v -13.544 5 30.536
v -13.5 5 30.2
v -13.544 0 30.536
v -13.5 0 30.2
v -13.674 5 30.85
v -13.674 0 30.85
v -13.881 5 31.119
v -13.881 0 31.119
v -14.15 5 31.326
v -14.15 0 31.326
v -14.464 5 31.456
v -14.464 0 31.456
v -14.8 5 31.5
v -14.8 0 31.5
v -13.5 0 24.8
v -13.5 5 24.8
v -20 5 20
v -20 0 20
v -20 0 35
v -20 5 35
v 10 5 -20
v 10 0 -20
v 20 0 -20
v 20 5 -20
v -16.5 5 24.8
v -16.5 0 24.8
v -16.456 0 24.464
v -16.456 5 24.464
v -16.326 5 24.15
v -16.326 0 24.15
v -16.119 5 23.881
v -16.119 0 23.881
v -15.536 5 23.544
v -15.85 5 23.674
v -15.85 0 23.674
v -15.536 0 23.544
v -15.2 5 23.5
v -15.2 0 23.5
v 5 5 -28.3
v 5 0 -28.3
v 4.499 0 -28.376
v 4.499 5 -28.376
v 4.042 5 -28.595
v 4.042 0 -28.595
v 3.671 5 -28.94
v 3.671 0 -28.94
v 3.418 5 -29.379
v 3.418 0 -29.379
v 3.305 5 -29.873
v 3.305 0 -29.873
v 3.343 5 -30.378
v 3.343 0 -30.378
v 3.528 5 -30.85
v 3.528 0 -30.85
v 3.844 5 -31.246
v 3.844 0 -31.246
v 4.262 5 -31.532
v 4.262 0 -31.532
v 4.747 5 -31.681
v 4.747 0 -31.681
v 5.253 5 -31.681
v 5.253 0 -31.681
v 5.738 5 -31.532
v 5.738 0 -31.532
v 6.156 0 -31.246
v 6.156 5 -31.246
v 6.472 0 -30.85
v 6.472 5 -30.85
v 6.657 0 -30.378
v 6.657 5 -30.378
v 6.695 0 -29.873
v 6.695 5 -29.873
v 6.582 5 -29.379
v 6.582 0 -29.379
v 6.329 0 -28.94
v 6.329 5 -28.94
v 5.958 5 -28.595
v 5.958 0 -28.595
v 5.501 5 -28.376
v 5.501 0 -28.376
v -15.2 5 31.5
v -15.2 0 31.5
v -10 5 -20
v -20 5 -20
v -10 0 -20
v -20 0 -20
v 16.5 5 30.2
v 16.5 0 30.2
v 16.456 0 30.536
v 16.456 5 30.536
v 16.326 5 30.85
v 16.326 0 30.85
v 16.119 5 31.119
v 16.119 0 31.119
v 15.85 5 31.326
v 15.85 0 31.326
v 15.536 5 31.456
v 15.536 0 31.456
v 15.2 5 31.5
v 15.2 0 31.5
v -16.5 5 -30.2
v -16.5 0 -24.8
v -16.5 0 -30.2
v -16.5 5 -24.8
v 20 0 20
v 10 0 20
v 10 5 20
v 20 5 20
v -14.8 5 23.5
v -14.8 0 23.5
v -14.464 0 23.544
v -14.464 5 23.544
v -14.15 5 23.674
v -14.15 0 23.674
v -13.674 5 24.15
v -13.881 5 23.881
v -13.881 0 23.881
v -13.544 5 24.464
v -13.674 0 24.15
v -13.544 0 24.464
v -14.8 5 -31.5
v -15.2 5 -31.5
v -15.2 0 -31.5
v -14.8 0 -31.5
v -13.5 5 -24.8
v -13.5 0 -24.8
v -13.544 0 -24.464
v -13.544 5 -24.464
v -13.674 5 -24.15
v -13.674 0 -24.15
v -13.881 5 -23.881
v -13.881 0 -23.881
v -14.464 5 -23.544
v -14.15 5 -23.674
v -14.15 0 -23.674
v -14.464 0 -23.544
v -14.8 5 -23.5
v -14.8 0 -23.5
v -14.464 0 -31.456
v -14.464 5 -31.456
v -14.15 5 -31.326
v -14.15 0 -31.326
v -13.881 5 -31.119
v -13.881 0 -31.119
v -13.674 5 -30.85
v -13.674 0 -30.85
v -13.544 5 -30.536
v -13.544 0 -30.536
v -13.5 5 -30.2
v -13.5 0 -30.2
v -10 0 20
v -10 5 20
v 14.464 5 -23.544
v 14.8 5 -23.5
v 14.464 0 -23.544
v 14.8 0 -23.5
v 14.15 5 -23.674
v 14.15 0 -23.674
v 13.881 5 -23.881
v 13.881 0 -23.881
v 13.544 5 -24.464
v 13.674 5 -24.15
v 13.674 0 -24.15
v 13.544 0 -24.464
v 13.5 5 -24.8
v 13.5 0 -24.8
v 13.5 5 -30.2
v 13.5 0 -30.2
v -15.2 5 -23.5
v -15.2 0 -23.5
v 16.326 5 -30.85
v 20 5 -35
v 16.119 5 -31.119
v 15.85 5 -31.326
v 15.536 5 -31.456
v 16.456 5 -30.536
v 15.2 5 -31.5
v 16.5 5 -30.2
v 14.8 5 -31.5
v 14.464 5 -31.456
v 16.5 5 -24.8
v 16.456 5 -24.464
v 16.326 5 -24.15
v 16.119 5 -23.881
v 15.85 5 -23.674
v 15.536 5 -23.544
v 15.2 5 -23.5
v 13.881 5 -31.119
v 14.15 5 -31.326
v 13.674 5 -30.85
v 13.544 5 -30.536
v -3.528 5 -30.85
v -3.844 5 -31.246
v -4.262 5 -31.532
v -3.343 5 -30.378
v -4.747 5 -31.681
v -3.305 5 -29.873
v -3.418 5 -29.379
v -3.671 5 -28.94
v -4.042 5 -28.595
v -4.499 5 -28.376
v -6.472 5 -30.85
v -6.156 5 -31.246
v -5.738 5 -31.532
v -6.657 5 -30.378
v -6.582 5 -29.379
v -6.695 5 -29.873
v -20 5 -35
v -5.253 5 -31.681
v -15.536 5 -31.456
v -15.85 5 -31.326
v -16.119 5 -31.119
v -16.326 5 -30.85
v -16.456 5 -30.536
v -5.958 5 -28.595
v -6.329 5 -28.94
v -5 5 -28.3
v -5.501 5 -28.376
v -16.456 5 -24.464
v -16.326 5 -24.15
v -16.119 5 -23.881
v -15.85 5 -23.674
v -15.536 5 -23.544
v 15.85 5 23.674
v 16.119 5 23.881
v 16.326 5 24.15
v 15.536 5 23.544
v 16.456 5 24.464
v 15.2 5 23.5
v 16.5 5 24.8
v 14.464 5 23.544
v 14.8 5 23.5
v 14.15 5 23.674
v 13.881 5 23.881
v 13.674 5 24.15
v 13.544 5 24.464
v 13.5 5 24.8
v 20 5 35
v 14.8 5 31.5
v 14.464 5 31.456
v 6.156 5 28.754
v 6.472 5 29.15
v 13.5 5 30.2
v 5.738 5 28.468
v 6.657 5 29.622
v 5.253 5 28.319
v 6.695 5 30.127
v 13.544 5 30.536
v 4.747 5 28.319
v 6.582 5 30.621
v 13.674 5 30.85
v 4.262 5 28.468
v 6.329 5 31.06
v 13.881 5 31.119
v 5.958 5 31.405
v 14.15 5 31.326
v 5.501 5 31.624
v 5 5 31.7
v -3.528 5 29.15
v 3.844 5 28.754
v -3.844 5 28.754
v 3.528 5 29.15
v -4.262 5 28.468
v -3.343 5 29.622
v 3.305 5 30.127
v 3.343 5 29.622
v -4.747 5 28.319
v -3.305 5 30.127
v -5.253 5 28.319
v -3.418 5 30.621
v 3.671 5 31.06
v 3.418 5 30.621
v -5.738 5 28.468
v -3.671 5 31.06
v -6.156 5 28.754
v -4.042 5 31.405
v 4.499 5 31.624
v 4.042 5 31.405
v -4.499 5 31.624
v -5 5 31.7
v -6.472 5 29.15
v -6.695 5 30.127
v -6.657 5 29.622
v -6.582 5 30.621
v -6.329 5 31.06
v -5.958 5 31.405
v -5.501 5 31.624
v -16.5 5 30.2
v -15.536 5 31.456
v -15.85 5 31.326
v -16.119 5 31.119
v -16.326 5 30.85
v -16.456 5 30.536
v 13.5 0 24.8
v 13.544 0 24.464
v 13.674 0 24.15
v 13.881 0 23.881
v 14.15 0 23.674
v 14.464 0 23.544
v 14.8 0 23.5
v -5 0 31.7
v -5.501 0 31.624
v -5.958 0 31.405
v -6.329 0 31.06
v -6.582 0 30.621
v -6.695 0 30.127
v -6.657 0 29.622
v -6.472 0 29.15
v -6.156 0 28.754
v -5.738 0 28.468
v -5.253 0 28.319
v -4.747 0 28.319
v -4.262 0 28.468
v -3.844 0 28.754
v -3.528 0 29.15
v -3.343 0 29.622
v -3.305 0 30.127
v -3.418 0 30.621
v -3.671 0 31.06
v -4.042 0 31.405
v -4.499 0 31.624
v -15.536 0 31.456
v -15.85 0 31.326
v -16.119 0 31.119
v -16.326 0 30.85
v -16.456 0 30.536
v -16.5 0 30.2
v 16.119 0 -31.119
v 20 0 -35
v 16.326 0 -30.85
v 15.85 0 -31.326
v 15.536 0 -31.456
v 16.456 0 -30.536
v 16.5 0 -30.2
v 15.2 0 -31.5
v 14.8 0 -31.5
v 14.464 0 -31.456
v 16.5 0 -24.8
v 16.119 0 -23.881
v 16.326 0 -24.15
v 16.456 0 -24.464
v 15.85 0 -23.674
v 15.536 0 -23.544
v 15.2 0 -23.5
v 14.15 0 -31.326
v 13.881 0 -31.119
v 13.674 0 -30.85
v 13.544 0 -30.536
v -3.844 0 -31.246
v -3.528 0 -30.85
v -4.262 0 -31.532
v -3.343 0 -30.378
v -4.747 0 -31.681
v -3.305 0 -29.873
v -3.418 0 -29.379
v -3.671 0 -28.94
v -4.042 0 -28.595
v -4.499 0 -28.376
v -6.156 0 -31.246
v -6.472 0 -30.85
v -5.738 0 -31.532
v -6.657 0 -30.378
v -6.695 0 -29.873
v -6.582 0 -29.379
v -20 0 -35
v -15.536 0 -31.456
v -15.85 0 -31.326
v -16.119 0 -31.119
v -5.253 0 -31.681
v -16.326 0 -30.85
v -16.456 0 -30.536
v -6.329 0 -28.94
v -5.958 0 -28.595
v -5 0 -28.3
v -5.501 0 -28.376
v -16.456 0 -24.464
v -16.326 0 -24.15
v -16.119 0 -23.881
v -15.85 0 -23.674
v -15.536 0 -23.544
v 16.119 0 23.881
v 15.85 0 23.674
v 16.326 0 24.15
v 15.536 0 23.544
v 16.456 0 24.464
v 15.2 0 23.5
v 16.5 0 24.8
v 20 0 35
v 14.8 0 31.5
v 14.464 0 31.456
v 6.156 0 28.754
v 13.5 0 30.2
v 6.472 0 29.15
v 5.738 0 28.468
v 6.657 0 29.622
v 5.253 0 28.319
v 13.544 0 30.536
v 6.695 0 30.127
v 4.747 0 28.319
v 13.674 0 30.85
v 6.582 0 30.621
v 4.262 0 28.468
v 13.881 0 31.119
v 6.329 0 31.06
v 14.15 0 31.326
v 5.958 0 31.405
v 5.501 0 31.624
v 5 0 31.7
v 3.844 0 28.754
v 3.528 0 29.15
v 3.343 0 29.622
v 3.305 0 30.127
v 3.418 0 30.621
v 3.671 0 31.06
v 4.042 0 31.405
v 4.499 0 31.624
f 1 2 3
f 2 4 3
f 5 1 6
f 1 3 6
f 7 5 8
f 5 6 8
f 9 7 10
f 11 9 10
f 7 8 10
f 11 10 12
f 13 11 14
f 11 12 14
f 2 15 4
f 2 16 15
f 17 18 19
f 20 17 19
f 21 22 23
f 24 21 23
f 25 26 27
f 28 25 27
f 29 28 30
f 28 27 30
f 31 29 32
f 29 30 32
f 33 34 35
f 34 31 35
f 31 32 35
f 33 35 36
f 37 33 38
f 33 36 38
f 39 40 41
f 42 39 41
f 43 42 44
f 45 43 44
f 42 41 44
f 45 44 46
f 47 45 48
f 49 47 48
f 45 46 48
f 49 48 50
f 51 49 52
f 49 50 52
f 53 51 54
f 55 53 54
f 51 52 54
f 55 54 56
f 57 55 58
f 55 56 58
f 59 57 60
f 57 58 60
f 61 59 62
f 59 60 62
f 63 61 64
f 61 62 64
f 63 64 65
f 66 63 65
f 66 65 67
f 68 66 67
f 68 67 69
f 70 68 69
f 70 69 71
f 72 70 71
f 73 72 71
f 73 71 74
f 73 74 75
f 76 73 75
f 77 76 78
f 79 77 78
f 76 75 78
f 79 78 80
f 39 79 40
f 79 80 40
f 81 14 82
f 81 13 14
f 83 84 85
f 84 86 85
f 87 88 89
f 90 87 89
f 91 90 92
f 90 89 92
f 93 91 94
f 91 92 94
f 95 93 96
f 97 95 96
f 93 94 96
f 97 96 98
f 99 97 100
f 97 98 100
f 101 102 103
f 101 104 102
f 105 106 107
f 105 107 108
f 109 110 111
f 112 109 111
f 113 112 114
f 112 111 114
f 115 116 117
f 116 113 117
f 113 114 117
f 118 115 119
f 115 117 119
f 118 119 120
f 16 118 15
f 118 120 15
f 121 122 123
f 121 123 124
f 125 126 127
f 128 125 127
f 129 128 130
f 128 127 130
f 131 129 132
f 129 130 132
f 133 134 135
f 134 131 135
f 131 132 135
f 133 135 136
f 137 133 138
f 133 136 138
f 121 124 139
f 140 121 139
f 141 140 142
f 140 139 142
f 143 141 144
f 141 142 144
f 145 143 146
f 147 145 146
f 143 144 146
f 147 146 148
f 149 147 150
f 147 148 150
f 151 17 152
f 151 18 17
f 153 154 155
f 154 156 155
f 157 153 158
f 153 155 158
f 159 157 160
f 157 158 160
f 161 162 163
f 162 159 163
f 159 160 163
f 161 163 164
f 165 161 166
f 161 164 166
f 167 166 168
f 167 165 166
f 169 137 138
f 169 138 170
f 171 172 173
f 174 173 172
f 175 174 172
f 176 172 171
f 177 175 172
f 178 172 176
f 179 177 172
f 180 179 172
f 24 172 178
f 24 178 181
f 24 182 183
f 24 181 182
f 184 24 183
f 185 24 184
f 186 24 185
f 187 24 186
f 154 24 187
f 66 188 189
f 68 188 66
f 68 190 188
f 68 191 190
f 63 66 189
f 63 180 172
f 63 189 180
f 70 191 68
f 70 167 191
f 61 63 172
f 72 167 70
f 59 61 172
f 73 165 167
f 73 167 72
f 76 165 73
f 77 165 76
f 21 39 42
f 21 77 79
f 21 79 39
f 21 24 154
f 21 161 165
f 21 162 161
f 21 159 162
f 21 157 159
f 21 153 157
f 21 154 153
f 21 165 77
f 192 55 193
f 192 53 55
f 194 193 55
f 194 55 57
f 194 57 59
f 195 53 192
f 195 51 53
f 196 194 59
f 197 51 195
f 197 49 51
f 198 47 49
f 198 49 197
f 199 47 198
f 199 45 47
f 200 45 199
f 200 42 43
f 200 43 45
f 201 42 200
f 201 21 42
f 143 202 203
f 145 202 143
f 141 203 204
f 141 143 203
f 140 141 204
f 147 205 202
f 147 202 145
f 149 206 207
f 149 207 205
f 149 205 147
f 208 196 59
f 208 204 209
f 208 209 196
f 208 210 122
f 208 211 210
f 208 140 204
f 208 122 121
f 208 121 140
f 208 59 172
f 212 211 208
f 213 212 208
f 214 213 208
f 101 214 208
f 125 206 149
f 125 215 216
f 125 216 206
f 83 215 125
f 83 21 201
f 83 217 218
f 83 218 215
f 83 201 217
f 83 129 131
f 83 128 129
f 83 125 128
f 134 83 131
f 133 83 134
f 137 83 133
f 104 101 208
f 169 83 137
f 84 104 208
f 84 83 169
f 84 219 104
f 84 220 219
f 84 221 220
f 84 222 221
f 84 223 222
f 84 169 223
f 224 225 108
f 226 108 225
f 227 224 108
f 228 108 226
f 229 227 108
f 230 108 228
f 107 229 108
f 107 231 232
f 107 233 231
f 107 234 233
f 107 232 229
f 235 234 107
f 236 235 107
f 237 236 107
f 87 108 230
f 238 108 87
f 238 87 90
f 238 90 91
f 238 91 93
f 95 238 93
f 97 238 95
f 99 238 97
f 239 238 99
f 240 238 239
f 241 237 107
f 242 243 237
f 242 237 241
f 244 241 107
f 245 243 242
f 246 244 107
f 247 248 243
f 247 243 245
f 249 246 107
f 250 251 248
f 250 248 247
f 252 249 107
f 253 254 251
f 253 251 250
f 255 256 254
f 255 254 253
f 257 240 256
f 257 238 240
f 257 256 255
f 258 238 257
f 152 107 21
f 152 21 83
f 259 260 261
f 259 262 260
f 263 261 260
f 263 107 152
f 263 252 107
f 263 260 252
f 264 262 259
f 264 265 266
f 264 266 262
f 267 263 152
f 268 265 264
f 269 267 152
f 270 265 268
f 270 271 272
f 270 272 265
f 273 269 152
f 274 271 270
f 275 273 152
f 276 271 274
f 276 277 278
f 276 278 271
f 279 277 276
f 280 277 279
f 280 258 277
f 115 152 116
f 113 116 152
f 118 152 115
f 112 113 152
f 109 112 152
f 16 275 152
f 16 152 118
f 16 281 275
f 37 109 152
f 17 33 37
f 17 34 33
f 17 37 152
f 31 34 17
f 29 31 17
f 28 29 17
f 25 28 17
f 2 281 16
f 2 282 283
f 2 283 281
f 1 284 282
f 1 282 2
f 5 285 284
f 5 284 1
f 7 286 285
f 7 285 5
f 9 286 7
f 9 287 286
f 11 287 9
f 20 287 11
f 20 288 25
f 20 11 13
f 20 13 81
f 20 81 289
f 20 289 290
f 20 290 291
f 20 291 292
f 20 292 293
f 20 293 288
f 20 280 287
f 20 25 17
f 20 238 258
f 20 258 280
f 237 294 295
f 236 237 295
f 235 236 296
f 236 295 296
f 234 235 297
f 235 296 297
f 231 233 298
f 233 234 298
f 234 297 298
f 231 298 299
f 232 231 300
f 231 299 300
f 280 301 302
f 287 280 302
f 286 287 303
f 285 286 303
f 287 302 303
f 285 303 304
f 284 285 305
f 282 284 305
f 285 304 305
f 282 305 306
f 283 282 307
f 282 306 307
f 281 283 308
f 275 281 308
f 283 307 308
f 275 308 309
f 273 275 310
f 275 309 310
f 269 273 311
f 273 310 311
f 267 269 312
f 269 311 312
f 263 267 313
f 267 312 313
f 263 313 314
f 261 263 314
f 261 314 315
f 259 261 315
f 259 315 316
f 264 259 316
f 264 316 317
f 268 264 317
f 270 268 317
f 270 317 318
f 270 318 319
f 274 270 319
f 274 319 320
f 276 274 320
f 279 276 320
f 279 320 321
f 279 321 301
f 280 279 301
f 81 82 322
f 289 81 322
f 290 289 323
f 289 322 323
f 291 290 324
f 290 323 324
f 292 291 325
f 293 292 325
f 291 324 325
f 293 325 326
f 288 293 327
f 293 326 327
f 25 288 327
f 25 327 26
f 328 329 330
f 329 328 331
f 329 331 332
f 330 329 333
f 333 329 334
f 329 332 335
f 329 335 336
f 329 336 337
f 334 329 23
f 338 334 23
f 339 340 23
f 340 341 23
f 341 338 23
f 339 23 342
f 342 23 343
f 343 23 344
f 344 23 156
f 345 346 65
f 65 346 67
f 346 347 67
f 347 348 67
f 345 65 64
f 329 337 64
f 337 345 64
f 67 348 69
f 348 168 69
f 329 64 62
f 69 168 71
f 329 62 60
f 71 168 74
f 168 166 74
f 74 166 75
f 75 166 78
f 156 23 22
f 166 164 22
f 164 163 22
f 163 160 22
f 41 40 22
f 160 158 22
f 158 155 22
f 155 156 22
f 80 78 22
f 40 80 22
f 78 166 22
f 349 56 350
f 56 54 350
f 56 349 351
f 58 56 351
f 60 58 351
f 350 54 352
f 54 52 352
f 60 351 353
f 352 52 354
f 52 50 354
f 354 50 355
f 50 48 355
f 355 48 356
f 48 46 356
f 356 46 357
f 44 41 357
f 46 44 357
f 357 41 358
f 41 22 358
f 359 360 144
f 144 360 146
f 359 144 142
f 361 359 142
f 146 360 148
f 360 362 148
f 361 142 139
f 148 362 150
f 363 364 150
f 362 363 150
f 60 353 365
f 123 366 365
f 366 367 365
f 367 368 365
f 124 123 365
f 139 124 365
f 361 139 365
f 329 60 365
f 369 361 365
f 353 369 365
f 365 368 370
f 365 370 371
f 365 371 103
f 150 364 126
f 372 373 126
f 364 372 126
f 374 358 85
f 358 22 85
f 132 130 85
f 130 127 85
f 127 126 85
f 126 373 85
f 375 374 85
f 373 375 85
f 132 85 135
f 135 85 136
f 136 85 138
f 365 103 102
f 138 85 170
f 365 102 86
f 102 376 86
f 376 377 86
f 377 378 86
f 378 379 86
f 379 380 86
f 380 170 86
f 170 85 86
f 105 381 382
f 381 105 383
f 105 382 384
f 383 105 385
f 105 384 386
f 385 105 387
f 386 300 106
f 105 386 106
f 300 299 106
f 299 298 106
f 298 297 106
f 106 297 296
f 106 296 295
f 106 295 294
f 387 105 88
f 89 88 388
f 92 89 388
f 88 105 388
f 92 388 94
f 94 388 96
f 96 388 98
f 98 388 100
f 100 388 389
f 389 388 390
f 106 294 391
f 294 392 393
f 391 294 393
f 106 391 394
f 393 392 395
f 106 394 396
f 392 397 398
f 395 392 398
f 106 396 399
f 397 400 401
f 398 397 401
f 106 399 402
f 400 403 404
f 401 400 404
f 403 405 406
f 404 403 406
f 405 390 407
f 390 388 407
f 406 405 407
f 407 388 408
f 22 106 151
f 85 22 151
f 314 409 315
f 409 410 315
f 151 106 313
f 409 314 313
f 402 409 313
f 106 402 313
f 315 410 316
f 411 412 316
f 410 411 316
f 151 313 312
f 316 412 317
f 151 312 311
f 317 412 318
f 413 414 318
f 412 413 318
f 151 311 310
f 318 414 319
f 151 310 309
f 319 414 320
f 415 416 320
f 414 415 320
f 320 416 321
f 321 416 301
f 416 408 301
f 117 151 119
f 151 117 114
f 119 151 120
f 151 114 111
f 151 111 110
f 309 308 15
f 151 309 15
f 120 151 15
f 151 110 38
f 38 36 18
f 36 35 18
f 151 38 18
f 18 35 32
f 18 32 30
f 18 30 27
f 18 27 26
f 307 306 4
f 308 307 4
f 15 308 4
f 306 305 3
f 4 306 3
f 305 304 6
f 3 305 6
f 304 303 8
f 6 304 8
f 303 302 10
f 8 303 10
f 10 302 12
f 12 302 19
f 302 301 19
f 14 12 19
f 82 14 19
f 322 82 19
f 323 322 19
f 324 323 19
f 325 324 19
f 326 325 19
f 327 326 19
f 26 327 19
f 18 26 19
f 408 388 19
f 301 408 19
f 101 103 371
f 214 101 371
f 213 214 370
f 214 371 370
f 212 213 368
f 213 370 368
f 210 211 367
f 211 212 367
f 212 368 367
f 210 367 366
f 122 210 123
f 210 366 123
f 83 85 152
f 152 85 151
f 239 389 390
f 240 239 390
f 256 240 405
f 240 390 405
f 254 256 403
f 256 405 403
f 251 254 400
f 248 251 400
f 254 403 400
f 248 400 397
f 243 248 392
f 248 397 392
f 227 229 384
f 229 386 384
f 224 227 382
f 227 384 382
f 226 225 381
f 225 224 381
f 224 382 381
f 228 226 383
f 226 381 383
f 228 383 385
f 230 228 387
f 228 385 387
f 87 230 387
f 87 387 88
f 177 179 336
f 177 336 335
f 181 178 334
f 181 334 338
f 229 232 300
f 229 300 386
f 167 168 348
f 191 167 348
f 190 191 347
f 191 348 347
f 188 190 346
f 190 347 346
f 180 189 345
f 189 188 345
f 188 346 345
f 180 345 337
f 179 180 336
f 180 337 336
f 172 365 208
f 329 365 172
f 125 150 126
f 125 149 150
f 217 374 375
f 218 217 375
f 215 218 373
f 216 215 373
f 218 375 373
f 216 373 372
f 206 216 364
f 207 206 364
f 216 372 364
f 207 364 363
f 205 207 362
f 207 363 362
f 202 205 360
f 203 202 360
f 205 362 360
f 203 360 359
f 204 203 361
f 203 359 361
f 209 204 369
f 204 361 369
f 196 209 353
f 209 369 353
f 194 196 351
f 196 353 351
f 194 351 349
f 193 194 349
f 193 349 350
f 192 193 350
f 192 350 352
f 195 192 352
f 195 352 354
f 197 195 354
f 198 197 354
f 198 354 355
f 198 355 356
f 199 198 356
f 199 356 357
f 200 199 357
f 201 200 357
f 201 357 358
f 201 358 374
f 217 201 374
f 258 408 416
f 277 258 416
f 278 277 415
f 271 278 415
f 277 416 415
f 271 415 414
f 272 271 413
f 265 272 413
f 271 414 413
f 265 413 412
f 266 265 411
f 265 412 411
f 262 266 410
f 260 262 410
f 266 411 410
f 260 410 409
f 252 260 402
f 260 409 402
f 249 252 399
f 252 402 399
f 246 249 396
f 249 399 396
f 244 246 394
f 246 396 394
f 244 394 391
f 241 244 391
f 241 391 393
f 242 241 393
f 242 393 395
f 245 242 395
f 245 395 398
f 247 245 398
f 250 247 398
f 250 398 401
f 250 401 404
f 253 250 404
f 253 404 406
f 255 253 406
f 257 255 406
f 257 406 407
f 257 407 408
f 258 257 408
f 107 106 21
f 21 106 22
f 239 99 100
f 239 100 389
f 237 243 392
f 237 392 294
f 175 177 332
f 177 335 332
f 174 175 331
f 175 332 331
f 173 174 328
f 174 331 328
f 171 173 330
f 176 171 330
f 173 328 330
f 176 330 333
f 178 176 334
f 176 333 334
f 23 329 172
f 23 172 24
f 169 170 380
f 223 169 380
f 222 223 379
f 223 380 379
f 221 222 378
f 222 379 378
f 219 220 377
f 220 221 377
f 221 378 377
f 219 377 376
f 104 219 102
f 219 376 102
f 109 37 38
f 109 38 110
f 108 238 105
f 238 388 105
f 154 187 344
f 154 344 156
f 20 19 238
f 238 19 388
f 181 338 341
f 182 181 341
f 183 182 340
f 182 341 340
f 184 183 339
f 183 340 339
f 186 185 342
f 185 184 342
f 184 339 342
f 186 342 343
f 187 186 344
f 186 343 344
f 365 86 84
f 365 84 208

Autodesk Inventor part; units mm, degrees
ref_plane "YZ Plane" through (0, 0, 0) normal (1, 0, 0) x (0, 1, 0)
ref_plane "XZ Plane" through (0, 0, 0) normal (0, 1, 0) x (-1, 0, 0)
ref_plane "XY Plane" through (0, 0, 0) normal (0, 0, 1) x (1, 0, 0)
sketch "Sketch1" plane through (0, 0, 0) normal (0, 1, 0) x (-1, 0, 0)
  line L0 (-10, 20) -> (-10, 0)
  line L1 (10, 0) -> (10, 20)
  line L2 (20, 20) -> (10, 20)
  line L3 (-10, 20) -> (-20, 20)
  line L4 (20, 20) -> (20, 35)
  line L5 (-20, 35) -> (-20, 20)
  line L6 (20, 35) -> (-20, 35)
  line L7 (10, 0) -> (-10, 0) construction
  line L8 (10, 20) -> (-10, 20) construction
  line L9 (0, 20) -> (0, 0) construction
  line L10 (10, 15) -> (-10, 15) construction
  line L11 (10, 15) -> (0, 15) construction
  line L12 (0, 15) -> (-10, 15) construction
  line L13 (15, 35) -> (15, 27.5) construction
  line L14 (15, 27.5) -> (15, 20) construction
  line L15 (-15, 35) -> (-15, 27.5) construction
  line L16 (-15, 27.5) -> (-15, 20) construction
  line L17 (0, 15) -> (5, 15) construction
  line L18 (0, 15) -> (-5, 15) construction
  line L19 (5.1791, 30) -> (-4.8209, 30)
  line L20 (20, 27.5) -> (15, 27.5)
  line L21 (-20, 27.5) -> (-15, 27.5)
  line L22 (-10, -20) -> (-10, 0)
  line L23 (10, 0) -> (10, -20)
  line L24 (20, -20) -> (10, -20)
  line L25 (-10, -20) -> (-20, -20)
  line L26 (20, -20) -> (20, -35)
  line L27 (-20, -35) -> (-20, -20)
  line L28 (20, -35) -> (-20, -35)
  line L29 (10, -20) -> (-10, -20) construction
  line L30 (0, -20) -> (0, 0) construction
  line L31 (10, -15) -> (-10, -15) construction
  line L32 (10, -15) -> (0, -15) construction
  line L33 (0, -15) -> (-10, -15) construction
  line L34 (15, -35) -> (15, -27.5) construction
  line L35 (15, -27.5) -> (15, -20) construction
  line L36 (-15, -35) -> (-15, -27.5) construction
  line L37 (-15, -27.5) -> (-15, -20) construction
  line L38 (0, -15) -> (5, -15) construction
  line L39 (0, -15) -> (-5, -15) construction
  line L40 (5.1791, -30) -> (-4.8209, -30)
  line L41 (20, -27.5) -> (15, -27.5)
  line L42 (-20, -27.5) -> (-15, -27.5)
  dimension "outerW" = 15
  dimension "d84" = 5
  dimension "d127" = 20
  dimension "d128" = 35
  dimension "d129" = 5
extrude "Extrusion1" add sketch "Sketch1" along normal blind 5
sketch "Sketch8" plane through (0, 5, 0) normal (0, 1, 0) x (1, 0, 0)
  line L0 (-10, -20) -> (-10, 20) projected
  line L1 (-10, 20) -> (-20, 20) projected
  line L2 (-20, 20) -> (-20, 35) projected
  line L3 (-20, 35) -> (20, 35) projected
  line L4 (20, 35) -> (20, 20) projected
  line L5 (20, 20) -> (10, 20) projected
  line L6 (10, 20) -> (10, -20) projected
  line L7 (10, -20) -> (20, -20) projected
  line L8 (20, -20) -> (20, -35) projected
  line L9 (20, -35) -> (-20, -35) projected
  line L10 (-20, -35) -> (-20, -20) projected
  line L11 (-20, -20) -> (-10, -20) projected
  line L12 (-20, -20) -> (-20, -35) projected
  line L13 (-20, -27.5) -> (-15, -27.5)
  line L14 (20, -35) -> (20, -20) projected
  line L15 (20, -27.5) -> (15, -27.5)
  line L16 (20, -30) -> (-20, -30)
  line L17 (-5, -30) -> (5, -30)
  line L18 (5, -30) -> (5, -35)
  line L19 (-5, -35) -> (-5, -30)
  line L20 (-5, -30) -> (0, -30)
  line L21 (-10, 20) -> (-10, -20) projected
  line L22 (-10, 0) -> (10, 0)
  line L23 (10, 20) -> (20, 20)
  line L24 (20, 20) -> (20, 35)
  line L25 (20, 35) -> (-20, 35)
  line L26 (-20, 35) -> (-20, 20)
  line L27 (-20, 20) -> (-10, 20)
  line L28 (-20, 20) -> (-20, 35)
  line L29 (-20, 27.5) -> (-15, 27.5)
  line L30 (20, 35) -> (20, 20)
  line L31 (20, 27.5) -> (15, 27.5)
  line L32 (20, 30) -> (-20, 30)
  line L33 (-5, 30) -> (5, 30)
  line L34 (5, 30) -> (5, 35)
  line L35 (-5, 35) -> (-5, 30)
  line L36 (-5, 30) -> (0, 30)
  point P0 (0, 0)
  point P1 (0, -35)
  point P2 (0, 35)
  dimension "d130" = 5
hole "Hole12" at (-5, 5, 30) at (-5, 5, -30) at (5, 5, 30) at (5, 5, -30) direction (0, -1, 0) diameter 3.4 end through all clearance for "Socket Head Cap Screw ISO 4762" size "M3" standard "ISO"
sketch "Sketch9" plane through (0, 5, 0) normal (0, 1, 0) x (1, 0, 0)
  circle A0 centre (5, -30) radius 1.7 projected
  circle A1 centre (-5, -30) radius 1.7 projected
  circle A2 centre (-5, 30) radius 1.7 projected
  circle A3 centre (5, 30) radius 1.7 projected
  line L0 (-10, -20) -> (-10, 20) projected
  line L1 (-10, 20) -> (-20, 20) projected
  line L2 (-20, 20) -> (-20, 35) projected
  line L3 (-20, 35) -> (20, 35) projected
  line L4 (20, 35) -> (20, 20) projected
  line L5 (20, 20) -> (10, 20) projected
  line L6 (10, 20) -> (10, -20) projected
  line L7 (10, -20) -> (20, -20) projected
  line L8 (20, -20) -> (20, -35) projected
  line L9 (20, -35) -> (-20, -35) projected
  line L10 (-20, -35) -> (-20, -20) projected
  line L11 (-20, -20) -> (-10, -20) projected
  line L12 (-20, -20) -> (-20, -35) projected
  line L13 (20, -35) -> (20, -20) projected
  line L14 (-20, -35) -> (20, -35) projected
  line L15 (-13.5, -31.5) -> (-16.5, -31.5)
  line L16 (-16.5, -31.5) -> (-16.5, -23.5)
  line L17 (-16.5, -23.5) -> (-13.5, -23.5)
  line L18 (-13.5, -23.5) -> (-13.5, -31.5)
  line L19 (-13.5, -31.5) -> (-16.5, -23.5) construction
  line L20 (-16.5, -31.5) -> (-13.5, -23.5) construction
  line L21 (16.5, -31.5) -> (13.5, -31.5)
  line L22 (13.5, -31.5) -> (13.5, -23.5)
  line L23 (13.5, -23.5) -> (16.5, -23.5)
  line L24 (16.5, -23.5) -> (16.5, -31.5)
  line L25 (16.5, -31.5) -> (13.5, -23.5) construction
  line L26 (13.5, -31.5) -> (16.5, -23.5) construction
  point P0 (0, 0)
  point P1 (-15, -27.5)
  point P2 (15, -27.5)
  dimension "d140" = 3
  dimension "d141" = 8
  dimension "d142" = 3
  dimension "d143" = 8
extrude "Extrusion4" cut sketch "Sketch9" against normal through all contours L15 L16 L17 L18 | L21 L22 L23 L24
mirror "Mirror3" about plane through (0, 0, 0) normal (0, 0, 1) of "Extrusion4"
fillet "Fillet4" radius 1.3 16 edges at (-16.5, 2.5, 23.5) (-13.5, 2.5, 23.5) (13.5, 2.5, 23.5) (16.5, 2.5, 23.5) (-16.5, 2.5, 31.5) (-13.5, 2.5, 31.5) (13.5, 2.5, 31.5) (16.5, 2.5, 31.5) (-16.5, 2.5, -31.5) (-13.5, 2.5, -31.5) (-16.5, 2.5, -23.5) (-13.5, 2.5, -23.5) (13.5, 2.5, -23.5) (16.5, 2.5, -23.5) (13.5, 2.5, -31.5) (16.5, 2.5, -31.5)
properties part number "mount-base" material "Copper"
